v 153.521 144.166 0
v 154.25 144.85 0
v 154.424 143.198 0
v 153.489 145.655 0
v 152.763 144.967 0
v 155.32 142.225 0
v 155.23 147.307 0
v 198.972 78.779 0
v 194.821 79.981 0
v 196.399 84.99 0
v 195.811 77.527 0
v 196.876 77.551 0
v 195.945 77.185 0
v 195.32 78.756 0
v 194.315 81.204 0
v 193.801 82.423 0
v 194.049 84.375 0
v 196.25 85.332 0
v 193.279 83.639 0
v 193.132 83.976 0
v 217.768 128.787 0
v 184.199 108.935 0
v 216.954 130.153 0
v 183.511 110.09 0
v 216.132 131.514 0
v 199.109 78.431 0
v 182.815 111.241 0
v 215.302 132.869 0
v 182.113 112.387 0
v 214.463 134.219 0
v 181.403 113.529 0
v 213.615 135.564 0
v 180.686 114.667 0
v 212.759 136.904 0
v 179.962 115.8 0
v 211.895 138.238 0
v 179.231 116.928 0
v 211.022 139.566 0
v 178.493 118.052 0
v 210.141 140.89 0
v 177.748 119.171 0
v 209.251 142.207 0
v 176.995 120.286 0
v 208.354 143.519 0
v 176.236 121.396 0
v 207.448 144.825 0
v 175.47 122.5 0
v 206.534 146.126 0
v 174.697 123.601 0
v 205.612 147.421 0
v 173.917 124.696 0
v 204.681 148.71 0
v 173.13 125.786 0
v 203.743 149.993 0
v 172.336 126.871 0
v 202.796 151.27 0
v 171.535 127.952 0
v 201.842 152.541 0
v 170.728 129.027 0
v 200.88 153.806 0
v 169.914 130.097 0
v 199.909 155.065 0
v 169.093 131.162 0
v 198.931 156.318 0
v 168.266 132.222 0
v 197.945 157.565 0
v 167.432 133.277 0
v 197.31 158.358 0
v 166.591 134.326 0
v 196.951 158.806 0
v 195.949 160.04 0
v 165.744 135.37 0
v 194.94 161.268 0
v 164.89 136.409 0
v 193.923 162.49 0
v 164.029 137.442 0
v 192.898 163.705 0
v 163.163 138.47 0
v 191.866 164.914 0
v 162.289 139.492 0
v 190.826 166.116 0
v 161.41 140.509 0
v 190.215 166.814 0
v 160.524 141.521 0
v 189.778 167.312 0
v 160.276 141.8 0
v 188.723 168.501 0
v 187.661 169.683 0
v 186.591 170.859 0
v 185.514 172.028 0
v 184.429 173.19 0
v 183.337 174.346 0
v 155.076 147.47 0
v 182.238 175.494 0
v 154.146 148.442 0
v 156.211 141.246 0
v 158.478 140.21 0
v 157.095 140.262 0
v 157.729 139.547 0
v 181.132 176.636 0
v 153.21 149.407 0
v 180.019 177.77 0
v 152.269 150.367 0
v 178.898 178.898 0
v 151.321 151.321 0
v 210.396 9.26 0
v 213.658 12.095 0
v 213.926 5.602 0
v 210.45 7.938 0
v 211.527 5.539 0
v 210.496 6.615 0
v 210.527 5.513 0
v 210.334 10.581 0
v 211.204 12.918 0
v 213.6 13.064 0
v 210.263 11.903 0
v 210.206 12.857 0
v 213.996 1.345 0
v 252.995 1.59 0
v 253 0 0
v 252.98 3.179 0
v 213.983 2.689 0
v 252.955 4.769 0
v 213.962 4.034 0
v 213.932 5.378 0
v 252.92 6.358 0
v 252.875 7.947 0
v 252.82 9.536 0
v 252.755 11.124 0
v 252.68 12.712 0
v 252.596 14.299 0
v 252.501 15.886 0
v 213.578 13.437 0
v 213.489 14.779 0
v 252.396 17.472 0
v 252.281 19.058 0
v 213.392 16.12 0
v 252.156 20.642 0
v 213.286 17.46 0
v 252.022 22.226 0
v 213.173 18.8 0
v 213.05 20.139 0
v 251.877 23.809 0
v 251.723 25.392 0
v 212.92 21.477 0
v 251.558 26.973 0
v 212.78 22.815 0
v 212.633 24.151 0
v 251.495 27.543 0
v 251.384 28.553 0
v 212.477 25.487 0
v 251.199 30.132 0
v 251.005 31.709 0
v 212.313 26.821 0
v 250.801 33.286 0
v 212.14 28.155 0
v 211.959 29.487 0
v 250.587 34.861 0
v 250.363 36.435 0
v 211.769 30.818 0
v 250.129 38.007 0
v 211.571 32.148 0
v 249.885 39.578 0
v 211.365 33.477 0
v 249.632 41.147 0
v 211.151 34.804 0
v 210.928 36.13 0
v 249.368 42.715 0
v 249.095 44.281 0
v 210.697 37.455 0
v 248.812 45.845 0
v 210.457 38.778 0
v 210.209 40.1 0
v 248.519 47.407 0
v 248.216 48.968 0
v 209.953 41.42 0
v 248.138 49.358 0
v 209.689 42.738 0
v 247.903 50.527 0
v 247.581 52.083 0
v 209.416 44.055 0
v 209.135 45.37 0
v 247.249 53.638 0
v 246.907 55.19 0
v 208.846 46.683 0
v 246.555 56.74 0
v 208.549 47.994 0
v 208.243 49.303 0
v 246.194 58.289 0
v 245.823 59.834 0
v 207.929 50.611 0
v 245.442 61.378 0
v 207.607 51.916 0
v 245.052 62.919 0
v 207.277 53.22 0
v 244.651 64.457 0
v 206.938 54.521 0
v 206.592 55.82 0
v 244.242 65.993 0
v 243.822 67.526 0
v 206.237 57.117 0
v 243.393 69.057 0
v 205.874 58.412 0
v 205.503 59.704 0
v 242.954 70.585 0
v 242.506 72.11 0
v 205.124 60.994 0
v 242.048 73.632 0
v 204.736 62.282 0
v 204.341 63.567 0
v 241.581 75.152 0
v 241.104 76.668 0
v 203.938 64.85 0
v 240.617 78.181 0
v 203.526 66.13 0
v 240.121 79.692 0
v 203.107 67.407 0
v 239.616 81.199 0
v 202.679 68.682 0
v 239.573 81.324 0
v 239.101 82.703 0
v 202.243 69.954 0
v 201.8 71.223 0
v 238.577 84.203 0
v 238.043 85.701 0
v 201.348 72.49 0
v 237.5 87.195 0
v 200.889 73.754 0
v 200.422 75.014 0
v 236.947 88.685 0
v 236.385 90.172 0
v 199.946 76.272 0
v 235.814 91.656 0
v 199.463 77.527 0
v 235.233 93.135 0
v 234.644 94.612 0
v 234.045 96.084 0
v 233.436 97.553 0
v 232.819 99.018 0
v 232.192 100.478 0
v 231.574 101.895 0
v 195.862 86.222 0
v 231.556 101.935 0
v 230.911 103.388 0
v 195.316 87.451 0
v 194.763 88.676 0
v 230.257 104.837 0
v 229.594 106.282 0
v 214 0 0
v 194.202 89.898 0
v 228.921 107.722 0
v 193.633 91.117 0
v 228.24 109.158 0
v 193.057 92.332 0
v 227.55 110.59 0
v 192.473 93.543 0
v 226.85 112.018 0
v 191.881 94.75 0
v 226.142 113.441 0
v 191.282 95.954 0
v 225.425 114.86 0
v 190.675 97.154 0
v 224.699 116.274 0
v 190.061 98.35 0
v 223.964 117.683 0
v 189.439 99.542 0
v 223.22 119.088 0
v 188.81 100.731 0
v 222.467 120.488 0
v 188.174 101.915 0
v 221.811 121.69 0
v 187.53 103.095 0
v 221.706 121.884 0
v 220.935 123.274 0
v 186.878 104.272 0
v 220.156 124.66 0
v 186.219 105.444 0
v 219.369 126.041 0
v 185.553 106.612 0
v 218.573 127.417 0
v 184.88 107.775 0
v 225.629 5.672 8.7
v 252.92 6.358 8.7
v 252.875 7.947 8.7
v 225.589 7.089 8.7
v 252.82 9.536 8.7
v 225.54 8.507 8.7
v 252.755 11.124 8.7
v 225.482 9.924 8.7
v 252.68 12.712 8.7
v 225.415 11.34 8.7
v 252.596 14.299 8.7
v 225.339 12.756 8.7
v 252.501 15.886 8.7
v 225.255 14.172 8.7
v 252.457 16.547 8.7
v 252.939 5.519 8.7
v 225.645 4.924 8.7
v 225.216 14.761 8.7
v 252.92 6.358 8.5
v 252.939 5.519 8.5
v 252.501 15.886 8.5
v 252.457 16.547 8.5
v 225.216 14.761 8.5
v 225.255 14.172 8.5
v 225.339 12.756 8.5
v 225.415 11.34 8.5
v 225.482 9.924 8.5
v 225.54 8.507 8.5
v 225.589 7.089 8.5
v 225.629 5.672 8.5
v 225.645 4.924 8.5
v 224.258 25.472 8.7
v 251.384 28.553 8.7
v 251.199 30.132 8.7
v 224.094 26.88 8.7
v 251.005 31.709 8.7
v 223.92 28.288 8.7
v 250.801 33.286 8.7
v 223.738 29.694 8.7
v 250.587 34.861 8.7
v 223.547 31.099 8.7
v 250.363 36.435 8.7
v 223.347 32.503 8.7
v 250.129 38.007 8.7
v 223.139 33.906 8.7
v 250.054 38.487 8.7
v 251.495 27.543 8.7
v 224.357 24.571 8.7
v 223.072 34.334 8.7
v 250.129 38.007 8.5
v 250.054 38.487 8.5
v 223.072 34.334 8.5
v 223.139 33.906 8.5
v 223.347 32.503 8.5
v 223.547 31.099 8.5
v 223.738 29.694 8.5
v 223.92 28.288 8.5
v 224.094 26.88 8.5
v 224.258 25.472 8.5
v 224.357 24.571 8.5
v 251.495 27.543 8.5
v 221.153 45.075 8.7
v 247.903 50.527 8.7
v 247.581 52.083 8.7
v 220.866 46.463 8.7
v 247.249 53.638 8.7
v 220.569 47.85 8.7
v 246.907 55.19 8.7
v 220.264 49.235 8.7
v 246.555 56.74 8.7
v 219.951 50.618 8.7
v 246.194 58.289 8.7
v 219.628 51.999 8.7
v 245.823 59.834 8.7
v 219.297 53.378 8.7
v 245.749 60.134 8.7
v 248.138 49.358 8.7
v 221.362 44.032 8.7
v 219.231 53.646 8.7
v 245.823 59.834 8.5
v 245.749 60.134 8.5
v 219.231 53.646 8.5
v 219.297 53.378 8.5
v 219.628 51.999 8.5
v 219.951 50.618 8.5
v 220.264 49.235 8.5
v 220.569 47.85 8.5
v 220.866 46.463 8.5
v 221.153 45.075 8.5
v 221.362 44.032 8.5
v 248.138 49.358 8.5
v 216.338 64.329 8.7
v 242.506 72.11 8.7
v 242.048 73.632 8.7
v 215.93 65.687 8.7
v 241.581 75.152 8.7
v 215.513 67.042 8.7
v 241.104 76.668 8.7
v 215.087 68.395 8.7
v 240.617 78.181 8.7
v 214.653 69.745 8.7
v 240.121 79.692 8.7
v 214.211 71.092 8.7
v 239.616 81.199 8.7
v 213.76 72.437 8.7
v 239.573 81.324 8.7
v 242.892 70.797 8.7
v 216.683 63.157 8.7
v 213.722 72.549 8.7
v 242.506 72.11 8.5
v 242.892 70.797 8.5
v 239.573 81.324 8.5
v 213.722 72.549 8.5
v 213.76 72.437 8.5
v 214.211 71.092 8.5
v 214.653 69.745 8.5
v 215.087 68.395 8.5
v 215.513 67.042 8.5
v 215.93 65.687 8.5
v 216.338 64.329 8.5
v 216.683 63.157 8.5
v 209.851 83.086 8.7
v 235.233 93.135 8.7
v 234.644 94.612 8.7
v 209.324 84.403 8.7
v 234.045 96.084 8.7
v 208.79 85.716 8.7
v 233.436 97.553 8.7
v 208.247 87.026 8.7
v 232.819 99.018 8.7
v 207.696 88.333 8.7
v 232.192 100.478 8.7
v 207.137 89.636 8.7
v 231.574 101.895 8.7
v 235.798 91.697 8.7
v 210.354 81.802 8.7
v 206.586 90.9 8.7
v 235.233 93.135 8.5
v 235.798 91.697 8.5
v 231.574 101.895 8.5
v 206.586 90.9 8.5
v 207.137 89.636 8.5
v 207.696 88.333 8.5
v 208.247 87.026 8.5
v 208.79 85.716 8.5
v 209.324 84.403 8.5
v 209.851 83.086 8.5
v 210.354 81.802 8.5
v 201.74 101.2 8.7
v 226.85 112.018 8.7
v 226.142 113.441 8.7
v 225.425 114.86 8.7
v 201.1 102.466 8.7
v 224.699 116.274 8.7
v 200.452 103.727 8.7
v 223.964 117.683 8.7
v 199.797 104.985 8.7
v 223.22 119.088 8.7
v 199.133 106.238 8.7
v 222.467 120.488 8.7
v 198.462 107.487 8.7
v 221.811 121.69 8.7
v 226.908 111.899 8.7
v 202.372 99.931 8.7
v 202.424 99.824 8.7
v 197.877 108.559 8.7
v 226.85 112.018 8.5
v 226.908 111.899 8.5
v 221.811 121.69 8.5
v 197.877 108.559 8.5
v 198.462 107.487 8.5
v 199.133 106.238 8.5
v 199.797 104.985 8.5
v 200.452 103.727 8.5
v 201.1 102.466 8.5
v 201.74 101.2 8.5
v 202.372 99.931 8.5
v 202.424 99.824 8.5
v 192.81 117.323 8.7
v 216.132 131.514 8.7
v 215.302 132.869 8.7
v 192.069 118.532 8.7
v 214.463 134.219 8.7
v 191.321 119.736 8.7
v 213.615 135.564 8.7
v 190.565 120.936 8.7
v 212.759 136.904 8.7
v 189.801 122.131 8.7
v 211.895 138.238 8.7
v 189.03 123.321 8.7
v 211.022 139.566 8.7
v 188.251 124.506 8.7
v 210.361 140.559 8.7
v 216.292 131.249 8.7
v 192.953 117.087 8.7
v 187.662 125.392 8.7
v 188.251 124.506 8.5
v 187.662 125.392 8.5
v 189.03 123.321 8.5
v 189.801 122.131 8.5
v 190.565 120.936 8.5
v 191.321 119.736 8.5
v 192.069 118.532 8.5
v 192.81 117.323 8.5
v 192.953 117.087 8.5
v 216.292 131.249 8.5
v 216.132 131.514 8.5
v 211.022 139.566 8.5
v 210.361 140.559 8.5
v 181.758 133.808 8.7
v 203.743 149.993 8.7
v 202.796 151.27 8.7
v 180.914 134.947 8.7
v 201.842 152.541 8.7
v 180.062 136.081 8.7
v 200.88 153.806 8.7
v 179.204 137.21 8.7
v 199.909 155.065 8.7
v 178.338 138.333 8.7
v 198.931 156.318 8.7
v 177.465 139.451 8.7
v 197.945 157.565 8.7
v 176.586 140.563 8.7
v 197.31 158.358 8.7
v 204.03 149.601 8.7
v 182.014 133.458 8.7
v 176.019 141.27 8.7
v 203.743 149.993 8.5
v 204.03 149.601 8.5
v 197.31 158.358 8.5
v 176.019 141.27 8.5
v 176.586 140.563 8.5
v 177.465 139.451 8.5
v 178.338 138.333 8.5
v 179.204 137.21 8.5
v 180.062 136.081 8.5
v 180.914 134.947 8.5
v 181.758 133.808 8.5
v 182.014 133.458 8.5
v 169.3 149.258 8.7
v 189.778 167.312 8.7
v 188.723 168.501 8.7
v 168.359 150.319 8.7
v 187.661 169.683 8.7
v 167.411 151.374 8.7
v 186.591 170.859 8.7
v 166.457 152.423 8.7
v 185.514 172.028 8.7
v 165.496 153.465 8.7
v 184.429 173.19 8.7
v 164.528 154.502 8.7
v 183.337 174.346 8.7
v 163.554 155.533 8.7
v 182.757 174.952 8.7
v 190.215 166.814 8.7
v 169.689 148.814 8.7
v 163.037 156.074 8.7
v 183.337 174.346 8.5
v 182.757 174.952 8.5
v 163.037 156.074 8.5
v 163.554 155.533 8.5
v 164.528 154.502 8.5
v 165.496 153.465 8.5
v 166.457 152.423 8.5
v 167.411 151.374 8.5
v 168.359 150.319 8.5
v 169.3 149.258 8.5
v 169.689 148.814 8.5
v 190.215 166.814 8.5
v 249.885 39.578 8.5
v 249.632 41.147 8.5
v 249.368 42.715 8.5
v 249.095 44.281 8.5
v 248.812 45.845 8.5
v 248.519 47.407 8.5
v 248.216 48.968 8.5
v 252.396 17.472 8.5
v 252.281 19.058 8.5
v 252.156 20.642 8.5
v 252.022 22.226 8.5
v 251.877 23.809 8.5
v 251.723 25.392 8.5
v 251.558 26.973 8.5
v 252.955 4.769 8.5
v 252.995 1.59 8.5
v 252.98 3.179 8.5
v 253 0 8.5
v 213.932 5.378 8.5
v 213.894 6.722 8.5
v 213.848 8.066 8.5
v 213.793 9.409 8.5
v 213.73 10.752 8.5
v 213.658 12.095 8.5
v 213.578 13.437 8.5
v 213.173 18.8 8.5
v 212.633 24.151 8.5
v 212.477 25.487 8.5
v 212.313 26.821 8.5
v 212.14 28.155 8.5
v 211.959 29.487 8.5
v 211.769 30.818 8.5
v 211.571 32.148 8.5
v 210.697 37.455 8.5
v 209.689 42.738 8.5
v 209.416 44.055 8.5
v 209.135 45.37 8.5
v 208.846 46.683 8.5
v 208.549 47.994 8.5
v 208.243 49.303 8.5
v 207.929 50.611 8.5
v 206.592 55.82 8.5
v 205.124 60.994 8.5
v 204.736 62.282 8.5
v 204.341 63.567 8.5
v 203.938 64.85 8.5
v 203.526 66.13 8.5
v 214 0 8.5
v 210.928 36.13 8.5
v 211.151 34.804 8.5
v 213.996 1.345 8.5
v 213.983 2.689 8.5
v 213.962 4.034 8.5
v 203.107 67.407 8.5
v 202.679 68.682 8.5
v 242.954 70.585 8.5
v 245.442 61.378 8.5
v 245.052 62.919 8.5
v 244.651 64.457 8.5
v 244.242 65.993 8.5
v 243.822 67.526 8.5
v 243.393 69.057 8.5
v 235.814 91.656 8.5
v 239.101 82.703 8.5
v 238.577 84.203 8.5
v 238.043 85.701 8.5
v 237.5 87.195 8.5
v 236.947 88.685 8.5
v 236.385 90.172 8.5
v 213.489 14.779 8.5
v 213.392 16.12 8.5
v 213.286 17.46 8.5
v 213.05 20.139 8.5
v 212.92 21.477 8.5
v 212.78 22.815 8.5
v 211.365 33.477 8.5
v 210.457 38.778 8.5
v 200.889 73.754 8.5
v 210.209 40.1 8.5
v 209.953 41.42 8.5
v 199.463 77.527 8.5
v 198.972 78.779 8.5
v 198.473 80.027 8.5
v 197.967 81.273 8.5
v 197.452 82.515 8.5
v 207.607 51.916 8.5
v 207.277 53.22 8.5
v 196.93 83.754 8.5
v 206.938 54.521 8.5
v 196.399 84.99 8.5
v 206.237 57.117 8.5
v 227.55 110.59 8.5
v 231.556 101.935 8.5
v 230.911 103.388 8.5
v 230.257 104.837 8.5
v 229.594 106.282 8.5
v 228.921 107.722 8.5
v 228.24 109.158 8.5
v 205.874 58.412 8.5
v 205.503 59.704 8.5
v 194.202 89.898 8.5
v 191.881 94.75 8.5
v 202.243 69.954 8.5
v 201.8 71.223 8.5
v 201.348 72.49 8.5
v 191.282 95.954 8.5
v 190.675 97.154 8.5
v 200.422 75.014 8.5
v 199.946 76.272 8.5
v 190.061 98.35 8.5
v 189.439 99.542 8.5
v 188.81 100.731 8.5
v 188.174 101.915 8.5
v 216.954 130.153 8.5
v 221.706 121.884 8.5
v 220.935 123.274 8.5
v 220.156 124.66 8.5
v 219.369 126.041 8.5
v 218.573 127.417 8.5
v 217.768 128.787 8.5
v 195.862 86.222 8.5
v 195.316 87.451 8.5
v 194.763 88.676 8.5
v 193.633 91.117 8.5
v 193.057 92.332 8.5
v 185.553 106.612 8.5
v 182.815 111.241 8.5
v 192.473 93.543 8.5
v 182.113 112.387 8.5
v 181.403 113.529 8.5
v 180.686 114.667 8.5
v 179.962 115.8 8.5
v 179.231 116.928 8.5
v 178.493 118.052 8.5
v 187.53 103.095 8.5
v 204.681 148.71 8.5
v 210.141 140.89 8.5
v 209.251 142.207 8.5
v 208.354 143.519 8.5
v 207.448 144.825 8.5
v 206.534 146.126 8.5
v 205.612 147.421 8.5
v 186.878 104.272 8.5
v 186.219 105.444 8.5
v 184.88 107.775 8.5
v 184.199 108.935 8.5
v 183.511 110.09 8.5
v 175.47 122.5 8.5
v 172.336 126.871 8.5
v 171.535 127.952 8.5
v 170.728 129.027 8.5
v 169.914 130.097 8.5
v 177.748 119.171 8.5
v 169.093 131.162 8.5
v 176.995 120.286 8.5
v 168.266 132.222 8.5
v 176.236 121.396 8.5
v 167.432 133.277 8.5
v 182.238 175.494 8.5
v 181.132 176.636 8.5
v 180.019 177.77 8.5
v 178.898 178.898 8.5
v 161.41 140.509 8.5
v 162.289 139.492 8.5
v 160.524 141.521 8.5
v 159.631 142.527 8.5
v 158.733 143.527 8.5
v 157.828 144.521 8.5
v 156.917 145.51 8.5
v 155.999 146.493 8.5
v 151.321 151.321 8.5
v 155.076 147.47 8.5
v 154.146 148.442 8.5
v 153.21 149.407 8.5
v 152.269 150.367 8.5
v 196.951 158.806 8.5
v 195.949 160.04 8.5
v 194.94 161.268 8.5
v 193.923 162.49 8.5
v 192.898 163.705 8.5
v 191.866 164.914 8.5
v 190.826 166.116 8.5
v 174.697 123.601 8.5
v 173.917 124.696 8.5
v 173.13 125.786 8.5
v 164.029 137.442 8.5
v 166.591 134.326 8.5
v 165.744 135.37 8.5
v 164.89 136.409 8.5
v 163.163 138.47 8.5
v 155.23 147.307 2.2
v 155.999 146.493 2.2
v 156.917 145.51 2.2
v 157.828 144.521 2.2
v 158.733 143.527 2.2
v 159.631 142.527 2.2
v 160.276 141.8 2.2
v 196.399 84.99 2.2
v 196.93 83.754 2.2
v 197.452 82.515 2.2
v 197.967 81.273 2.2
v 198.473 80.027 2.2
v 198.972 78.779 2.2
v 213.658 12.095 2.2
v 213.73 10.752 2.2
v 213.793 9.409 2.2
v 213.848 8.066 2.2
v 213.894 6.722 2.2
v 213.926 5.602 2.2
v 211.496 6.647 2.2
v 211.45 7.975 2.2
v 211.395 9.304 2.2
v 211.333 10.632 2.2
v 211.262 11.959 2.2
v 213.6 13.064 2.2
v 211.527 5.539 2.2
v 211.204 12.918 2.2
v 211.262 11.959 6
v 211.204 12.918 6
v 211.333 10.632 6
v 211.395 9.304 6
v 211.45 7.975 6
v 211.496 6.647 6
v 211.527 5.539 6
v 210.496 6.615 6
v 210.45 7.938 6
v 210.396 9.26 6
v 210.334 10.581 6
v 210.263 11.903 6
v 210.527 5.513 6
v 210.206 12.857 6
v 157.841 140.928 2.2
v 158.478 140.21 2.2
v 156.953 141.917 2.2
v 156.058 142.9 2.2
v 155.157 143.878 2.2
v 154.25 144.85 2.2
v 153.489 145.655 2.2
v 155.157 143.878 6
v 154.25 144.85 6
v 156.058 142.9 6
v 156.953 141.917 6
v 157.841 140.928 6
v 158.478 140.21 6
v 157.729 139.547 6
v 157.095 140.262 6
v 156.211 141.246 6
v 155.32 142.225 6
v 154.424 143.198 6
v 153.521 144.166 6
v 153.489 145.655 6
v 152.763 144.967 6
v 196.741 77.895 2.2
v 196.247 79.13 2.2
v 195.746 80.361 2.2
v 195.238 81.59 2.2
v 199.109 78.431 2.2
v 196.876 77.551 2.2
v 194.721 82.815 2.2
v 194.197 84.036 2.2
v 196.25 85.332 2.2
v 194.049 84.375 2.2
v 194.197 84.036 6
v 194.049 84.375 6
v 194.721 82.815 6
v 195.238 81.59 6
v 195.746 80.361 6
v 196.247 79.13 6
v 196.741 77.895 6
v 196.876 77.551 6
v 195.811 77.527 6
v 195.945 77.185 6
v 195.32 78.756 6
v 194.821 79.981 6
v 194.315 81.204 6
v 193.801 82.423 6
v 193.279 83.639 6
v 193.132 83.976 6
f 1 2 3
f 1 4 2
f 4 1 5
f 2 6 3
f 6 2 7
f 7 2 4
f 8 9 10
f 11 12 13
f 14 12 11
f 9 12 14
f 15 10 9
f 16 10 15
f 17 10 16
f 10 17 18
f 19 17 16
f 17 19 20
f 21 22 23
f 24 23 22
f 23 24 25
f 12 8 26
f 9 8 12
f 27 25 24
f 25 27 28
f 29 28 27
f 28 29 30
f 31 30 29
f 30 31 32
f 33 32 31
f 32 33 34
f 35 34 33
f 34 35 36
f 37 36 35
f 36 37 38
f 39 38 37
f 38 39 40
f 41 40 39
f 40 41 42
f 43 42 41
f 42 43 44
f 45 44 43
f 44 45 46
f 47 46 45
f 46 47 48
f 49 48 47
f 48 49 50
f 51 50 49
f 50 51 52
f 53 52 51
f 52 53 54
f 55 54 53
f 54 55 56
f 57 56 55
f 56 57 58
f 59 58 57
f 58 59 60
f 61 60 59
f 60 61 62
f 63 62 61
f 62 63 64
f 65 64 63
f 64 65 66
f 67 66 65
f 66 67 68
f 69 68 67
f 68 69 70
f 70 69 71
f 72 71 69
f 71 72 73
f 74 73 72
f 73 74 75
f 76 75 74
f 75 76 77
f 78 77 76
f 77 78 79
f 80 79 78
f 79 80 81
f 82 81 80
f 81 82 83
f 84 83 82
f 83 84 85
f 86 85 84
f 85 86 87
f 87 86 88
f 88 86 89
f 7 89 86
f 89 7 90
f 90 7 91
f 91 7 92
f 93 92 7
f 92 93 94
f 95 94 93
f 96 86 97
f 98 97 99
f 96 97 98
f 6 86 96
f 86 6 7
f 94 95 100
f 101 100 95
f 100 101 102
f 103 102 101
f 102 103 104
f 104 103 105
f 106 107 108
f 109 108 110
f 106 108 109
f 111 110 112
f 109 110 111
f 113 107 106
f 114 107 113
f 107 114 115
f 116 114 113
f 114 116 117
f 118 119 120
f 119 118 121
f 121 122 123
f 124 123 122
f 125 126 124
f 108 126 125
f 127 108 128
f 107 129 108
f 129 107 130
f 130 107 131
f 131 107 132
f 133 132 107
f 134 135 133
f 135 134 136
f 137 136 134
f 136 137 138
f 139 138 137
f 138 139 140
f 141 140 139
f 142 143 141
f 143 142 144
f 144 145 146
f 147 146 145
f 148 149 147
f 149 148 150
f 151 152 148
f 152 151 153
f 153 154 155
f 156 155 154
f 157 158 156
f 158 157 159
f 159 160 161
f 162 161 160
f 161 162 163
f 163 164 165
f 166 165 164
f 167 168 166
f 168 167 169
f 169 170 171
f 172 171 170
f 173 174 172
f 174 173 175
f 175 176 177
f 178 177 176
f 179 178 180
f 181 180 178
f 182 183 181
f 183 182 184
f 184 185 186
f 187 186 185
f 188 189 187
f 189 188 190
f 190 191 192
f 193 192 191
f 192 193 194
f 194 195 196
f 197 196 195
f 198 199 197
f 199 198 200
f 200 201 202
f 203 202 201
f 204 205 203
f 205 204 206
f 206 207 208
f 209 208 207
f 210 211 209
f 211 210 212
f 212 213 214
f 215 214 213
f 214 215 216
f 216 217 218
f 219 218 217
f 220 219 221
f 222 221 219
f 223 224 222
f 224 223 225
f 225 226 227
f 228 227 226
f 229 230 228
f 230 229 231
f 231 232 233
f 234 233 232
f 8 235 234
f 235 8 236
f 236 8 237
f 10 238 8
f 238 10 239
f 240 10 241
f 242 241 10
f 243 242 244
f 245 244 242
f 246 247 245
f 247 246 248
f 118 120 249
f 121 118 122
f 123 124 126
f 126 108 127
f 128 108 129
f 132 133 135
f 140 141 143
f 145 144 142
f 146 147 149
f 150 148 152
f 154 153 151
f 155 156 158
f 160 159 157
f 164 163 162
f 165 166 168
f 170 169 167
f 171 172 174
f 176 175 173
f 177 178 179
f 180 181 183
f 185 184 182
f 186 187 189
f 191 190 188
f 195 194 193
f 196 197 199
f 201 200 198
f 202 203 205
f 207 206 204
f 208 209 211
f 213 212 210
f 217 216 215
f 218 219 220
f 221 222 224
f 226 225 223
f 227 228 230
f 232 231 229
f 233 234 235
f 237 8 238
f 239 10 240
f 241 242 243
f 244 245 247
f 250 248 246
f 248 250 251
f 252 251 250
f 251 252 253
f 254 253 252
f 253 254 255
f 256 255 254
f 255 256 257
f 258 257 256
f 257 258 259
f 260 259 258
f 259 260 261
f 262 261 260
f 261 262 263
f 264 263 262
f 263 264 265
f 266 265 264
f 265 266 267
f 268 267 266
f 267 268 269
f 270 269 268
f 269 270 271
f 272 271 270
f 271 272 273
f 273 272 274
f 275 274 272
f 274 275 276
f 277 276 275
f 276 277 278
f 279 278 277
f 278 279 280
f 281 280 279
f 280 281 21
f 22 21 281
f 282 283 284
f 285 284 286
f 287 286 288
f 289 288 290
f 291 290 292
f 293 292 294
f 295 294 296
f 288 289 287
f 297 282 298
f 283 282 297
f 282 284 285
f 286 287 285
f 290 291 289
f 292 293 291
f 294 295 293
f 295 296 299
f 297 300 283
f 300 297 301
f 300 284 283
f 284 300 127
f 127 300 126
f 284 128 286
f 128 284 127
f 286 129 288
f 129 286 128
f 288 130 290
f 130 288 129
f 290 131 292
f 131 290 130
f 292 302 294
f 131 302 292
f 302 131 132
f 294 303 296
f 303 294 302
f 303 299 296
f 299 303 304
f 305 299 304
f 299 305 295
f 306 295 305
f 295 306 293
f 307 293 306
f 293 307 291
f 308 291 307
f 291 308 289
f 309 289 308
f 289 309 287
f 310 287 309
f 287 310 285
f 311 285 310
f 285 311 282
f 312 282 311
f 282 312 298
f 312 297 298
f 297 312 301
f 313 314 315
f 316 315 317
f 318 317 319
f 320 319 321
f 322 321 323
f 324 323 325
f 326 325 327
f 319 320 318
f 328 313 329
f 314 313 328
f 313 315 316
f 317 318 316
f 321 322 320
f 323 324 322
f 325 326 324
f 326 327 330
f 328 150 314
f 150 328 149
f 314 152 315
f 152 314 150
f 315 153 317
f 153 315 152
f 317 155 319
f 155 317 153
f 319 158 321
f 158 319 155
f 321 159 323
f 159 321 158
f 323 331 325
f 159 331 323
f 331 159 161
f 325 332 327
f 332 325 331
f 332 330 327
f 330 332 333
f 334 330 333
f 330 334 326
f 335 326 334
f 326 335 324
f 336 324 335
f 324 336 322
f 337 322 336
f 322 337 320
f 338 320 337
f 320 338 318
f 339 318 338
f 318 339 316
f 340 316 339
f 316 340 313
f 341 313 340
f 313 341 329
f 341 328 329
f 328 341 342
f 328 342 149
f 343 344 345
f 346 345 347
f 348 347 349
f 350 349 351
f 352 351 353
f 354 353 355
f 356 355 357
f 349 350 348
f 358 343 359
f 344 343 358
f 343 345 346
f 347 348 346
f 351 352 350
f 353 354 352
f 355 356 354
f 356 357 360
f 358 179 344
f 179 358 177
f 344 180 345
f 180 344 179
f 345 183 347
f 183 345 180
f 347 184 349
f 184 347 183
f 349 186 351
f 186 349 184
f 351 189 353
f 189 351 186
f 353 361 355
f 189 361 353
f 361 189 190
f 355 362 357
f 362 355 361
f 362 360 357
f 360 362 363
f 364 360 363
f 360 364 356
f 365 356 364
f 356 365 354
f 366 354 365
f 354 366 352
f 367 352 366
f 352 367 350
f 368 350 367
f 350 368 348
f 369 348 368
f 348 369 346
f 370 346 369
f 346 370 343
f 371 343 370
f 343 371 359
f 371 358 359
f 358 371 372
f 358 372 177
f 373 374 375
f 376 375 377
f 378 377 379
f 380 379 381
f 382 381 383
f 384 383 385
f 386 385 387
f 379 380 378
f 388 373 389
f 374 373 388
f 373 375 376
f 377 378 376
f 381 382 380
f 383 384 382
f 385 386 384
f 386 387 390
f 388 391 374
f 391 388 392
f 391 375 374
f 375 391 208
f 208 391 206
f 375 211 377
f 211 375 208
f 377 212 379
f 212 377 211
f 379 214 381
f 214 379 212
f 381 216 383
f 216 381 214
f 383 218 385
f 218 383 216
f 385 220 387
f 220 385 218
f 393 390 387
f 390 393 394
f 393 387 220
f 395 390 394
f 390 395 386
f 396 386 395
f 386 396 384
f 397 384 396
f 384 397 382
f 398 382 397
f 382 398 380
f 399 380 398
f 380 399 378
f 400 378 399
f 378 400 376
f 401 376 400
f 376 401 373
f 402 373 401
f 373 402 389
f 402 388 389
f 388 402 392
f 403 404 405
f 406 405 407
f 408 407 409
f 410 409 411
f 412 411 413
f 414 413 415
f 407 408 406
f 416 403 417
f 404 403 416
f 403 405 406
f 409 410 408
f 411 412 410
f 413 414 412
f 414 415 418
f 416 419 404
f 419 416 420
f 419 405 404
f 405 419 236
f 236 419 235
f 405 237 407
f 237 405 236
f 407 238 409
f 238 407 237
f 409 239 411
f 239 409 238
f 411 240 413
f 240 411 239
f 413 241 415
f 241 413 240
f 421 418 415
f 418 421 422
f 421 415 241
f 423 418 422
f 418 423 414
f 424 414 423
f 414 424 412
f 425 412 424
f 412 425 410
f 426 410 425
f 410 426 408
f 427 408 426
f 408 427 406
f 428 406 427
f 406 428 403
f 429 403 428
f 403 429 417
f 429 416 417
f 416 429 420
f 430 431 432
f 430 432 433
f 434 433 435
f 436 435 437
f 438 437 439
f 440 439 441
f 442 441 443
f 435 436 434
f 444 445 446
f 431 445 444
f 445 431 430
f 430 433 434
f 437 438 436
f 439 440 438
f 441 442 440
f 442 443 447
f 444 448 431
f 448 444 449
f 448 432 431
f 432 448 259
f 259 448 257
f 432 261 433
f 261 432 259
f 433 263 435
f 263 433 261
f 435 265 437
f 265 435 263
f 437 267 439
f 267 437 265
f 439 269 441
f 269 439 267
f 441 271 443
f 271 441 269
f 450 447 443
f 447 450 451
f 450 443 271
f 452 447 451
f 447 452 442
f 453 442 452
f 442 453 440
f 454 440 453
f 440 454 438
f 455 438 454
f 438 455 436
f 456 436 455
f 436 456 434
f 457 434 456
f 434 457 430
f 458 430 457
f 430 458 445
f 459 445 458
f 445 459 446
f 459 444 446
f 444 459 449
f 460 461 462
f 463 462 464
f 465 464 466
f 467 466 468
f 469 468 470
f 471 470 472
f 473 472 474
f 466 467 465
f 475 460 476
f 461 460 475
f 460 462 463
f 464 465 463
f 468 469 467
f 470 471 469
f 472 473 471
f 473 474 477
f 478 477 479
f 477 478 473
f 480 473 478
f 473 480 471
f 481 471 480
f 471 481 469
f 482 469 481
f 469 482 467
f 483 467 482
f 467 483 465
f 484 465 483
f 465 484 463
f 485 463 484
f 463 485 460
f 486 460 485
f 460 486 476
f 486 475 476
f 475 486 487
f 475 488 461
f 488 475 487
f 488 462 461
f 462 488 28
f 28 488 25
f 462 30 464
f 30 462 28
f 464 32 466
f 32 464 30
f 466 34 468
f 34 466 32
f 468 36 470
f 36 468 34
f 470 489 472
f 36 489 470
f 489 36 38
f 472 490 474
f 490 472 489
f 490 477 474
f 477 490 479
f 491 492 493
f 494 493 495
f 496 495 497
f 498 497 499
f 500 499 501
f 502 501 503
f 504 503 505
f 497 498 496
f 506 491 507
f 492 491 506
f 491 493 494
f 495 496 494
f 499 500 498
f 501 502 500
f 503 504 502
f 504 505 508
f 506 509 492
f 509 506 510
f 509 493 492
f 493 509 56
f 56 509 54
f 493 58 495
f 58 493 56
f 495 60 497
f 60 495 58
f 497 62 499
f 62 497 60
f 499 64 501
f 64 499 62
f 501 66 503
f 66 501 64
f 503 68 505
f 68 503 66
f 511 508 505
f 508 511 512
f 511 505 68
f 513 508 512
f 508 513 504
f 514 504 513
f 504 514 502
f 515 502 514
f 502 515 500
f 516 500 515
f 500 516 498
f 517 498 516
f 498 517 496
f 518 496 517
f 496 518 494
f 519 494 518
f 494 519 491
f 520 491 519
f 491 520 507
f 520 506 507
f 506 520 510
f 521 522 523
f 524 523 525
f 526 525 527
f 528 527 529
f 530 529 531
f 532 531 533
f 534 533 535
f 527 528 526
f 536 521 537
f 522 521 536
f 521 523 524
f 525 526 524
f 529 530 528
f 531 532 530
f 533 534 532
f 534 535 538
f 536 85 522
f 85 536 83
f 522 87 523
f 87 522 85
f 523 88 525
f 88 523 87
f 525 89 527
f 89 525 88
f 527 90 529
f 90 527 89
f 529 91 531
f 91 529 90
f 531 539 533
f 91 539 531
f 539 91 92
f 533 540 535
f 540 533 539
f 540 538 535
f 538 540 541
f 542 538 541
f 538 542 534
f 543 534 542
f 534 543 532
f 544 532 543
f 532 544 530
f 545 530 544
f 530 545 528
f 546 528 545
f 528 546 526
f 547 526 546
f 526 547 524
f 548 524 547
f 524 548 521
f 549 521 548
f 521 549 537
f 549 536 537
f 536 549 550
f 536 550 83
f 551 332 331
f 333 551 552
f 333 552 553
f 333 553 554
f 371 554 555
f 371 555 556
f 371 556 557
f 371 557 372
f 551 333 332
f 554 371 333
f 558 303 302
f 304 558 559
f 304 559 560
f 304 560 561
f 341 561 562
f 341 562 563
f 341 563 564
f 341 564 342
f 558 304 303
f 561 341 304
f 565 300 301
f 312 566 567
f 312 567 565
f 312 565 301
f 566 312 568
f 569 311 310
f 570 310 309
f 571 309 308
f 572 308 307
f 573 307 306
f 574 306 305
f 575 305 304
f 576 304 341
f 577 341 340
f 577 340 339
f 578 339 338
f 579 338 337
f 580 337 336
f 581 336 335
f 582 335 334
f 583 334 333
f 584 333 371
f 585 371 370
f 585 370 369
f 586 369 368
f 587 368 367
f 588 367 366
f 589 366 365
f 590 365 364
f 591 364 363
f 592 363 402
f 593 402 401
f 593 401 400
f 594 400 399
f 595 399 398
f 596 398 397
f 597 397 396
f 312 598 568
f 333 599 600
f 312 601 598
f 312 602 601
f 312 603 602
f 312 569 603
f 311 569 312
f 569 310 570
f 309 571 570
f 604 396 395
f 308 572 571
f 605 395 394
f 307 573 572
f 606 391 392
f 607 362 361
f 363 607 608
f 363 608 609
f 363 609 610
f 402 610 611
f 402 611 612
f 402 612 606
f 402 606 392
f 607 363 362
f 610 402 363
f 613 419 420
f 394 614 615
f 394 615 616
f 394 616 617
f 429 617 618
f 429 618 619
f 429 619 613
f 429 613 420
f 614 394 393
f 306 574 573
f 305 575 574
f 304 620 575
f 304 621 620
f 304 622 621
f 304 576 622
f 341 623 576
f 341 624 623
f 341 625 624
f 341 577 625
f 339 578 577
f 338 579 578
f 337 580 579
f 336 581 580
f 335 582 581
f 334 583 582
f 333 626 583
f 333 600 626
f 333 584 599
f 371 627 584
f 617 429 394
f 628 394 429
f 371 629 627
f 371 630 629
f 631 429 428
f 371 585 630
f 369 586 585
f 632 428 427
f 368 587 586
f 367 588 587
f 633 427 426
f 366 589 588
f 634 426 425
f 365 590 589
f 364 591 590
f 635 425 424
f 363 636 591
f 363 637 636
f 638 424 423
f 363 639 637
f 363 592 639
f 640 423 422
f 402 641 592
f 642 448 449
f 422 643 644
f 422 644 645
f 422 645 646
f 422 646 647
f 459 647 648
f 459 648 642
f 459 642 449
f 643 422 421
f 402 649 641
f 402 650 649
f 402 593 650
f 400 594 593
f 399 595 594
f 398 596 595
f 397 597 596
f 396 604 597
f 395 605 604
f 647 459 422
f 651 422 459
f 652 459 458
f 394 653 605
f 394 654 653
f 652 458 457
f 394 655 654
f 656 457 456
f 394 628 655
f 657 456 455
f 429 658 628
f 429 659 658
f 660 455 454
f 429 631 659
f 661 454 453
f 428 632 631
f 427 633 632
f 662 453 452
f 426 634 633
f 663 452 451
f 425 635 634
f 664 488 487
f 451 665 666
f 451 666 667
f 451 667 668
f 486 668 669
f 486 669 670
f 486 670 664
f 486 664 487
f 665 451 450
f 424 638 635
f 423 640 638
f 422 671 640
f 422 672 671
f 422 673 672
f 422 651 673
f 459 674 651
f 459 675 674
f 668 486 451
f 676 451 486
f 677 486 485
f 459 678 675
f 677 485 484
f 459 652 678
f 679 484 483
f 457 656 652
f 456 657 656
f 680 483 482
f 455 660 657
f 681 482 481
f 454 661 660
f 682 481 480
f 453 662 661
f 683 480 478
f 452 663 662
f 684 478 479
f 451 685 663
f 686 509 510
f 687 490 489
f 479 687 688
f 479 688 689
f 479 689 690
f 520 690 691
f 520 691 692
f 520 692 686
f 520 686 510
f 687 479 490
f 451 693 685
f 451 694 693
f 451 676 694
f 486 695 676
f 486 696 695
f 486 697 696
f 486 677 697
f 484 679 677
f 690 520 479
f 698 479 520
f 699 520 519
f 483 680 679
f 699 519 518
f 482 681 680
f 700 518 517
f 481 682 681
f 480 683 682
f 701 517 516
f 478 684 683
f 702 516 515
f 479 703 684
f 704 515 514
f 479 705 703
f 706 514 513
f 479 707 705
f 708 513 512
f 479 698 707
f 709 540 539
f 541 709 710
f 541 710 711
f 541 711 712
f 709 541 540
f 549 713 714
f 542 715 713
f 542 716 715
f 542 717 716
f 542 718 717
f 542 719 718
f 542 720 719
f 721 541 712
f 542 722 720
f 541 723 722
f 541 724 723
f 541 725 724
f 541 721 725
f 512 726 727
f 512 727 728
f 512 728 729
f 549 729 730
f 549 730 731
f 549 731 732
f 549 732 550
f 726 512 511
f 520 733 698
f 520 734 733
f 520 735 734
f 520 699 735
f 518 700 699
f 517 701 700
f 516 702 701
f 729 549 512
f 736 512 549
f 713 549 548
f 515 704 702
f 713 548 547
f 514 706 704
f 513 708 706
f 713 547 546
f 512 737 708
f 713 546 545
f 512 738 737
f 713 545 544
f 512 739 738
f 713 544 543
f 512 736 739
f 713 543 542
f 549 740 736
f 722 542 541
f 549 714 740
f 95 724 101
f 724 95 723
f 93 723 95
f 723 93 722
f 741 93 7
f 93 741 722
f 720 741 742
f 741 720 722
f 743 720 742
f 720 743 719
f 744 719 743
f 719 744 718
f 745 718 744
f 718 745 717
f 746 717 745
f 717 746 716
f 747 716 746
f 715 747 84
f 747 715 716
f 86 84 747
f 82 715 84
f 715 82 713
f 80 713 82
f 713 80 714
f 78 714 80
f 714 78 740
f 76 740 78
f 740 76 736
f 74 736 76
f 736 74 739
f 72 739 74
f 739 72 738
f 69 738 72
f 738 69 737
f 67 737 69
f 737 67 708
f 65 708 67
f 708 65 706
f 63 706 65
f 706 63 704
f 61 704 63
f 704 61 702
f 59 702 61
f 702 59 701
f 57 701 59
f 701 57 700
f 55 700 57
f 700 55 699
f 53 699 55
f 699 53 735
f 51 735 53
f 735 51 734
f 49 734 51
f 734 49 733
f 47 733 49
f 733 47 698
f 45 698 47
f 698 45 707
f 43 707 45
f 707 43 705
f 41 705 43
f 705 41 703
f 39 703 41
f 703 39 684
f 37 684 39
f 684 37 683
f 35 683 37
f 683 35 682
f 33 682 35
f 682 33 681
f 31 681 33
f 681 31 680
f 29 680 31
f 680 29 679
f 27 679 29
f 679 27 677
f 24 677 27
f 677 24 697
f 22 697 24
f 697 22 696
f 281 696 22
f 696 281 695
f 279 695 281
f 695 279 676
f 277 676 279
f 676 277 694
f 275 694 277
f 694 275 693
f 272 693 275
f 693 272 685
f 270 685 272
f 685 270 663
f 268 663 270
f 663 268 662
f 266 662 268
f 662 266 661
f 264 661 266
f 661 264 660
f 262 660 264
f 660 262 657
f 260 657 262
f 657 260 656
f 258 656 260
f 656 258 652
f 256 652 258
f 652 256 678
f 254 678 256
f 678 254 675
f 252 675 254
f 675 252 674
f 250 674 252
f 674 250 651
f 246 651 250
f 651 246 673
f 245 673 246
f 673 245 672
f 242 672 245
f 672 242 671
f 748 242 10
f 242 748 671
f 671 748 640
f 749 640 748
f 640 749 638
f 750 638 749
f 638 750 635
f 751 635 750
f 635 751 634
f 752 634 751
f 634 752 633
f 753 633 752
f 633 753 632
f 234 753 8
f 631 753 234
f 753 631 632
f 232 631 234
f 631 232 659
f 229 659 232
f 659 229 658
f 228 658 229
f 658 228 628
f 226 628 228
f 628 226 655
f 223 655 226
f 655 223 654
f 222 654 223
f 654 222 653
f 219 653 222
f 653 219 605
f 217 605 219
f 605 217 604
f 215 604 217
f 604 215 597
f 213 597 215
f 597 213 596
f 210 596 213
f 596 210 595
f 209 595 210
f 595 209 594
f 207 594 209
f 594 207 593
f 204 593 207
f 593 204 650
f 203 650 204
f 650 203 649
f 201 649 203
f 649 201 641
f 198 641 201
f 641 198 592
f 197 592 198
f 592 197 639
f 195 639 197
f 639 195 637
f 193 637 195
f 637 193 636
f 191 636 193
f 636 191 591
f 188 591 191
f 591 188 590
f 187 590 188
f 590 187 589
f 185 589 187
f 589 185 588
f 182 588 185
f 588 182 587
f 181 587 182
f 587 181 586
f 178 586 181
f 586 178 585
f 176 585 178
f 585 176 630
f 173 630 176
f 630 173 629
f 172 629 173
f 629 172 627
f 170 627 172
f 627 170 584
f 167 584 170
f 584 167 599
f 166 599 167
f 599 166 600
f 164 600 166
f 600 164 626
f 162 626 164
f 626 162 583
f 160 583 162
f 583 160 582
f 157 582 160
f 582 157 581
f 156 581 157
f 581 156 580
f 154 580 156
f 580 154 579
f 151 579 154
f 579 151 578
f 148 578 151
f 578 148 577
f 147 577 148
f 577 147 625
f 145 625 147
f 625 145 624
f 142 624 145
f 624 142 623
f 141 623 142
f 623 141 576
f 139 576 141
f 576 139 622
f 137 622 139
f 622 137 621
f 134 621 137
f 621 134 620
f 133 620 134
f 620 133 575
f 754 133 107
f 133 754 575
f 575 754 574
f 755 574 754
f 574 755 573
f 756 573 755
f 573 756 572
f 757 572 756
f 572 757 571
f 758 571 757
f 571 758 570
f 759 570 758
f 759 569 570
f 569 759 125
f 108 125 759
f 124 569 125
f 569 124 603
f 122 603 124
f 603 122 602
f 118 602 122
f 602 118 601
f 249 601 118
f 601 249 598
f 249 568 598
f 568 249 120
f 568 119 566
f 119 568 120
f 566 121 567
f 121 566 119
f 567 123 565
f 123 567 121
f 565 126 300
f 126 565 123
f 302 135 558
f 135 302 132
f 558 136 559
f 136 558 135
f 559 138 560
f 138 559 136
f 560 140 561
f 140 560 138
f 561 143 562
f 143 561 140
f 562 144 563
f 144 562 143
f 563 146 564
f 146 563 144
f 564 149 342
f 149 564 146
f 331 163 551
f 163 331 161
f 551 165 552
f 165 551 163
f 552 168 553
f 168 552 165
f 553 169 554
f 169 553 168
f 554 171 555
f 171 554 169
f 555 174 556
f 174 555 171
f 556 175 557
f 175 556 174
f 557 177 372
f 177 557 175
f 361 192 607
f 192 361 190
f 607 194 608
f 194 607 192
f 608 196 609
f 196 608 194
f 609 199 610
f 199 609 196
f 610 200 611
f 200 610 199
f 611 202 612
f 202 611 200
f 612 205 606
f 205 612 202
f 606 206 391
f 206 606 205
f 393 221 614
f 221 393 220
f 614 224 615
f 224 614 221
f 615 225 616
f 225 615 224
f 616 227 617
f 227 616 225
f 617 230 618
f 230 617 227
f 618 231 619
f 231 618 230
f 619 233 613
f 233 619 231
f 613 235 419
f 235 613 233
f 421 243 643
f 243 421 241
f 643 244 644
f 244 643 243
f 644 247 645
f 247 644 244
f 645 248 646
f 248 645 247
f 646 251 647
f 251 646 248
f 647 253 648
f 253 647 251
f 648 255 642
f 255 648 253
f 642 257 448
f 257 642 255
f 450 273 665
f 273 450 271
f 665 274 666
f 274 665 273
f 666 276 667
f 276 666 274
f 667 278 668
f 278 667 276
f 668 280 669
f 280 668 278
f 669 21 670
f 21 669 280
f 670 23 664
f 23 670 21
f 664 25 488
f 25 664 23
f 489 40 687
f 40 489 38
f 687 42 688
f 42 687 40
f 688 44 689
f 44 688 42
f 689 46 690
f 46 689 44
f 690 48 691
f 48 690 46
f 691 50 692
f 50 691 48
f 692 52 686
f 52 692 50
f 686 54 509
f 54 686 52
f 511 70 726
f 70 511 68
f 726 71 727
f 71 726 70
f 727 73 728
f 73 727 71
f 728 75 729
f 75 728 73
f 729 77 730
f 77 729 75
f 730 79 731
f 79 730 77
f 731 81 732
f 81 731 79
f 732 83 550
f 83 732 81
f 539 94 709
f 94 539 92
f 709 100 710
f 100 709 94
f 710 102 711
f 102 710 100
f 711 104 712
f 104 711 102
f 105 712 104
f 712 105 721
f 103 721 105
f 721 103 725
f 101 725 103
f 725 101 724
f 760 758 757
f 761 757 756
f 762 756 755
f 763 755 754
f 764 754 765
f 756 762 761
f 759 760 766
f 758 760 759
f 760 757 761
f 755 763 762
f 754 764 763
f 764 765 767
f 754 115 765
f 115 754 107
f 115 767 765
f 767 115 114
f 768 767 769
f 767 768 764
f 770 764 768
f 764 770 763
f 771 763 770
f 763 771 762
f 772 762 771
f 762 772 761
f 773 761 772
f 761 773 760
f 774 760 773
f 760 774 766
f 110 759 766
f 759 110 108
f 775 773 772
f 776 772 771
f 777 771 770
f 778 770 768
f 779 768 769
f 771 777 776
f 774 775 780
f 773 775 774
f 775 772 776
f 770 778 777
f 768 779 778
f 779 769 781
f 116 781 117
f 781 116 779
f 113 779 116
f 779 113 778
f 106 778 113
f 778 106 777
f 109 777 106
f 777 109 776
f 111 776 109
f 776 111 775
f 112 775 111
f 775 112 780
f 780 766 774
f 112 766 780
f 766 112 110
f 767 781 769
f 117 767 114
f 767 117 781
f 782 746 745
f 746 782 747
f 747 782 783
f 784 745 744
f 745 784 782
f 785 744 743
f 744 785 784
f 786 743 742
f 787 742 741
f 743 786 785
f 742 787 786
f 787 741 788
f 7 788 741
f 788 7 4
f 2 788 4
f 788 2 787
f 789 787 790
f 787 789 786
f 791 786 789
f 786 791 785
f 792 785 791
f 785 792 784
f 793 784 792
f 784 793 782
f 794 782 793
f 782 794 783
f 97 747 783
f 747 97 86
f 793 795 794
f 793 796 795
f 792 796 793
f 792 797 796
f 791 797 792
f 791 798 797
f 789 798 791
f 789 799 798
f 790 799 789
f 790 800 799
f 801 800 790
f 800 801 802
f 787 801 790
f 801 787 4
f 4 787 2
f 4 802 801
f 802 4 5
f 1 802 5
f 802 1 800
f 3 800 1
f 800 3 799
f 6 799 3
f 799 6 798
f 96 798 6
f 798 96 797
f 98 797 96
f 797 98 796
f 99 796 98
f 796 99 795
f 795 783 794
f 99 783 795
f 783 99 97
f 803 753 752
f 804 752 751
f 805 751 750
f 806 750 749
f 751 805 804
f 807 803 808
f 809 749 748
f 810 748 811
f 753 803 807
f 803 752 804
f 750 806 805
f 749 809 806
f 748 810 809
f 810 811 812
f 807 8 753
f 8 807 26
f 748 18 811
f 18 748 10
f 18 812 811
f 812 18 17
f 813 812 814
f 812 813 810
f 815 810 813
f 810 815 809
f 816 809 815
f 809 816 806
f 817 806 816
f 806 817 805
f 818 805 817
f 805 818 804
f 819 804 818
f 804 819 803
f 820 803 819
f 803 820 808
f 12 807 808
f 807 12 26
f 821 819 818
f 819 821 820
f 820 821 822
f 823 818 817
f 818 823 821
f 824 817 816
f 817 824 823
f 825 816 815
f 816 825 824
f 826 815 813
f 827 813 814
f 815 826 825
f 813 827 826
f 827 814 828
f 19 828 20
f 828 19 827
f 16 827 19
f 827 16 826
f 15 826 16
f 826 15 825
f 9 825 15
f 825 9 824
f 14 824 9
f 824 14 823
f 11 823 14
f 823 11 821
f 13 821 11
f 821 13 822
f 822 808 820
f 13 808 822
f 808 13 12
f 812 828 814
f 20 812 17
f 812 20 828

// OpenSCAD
// file: 3d_arc.scad
// https://openhome.cc/eGossip/OpenSCAD/SectorArc.html

module sector(radius, begin, end, fn) {
    r = radius / cos(180 / fn);
    step = -360 / fn;

    points = concat([[0, 0]],
        [for(a = [begin : step : end - 360]) 
            [r * cos(a), r * sin(a)]
        ],
        [[r * cos(end), r * sin(end)]]
    );

    difference() {
        circle(radius, $fn = fn); // cilinder
        polygon(points);
    }
}

module arc(radius, begin, end, width, fn) {
    difference() {
        sector(radius + width, begin, end, fn);
        sector(radius, begin, end, fn);
    }
} 


module 3d_arc(height, radius, width, begin, end, fn) {
    linear_extrude(height) arc(radius, begin, end, width, fn);
}
// main file
// https://openhome.cc/eGossip/OpenSCAD/SectorArc.html

// width is the angle
// lenght is distance from the center of the circunference
// height is the thinkness

include <3d_arc.scad>

fn = 1000;

// kerb

kerb_radius = 214; // mm
kerb_length = 39; // mm
kerb_height = 8.5; // mm
kerb_width = 45; // deg

3d_arc(kerb_height, kerb_radius, kerb_length, 0, kerb_width, fn);

// hooks

hook_offset = 1.5; // deg
hook_width = 2; // deg
hook_bend_height = 2.2; // mm
hook_bend_length = 2.4; // mm
hook_barb_height = 6; // mm
hook_barb_length = 1; // mm

3d_arc(hook_bend_height, kerb_radius - hook_bend_length, hook_bend_length, hook_offset, hook_offset + hook_width, fn);
3d_arc(hook_barb_height, kerb_radius - hook_bend_length - hook_barb_length, hook_barb_length, hook_offset, hook_offset + hook_width, fn);

3d_arc(hook_bend_height, kerb_radius - hook_bend_length, hook_bend_length, kerb_width - hook_offset, kerb_width - hook_offset - hook_width, fn);
3d_arc(hook_barb_height, kerb_radius - hook_bend_length - hook_barb_length, hook_barb_length, kerb_width - hook_offset, kerb_width - hook_offset - hook_width, fn);

3d_arc(hook_bend_height, kerb_radius - hook_bend_length, hook_bend_length, kerb_width/2 - hook_width/2, kerb_width/2 + hook_width/2, fn);
3d_arc(hook_barb_height, kerb_radius - hook_bend_length - hook_barb_length, hook_barb_length, kerb_width/2 - hook_width/2, kerb_width/2 + hook_width/2, fn);

// strips

strip_count = 9; // #
strip_width = 0.5; // %
strip_length = 0.7; // %
strip_height = 0.2; // mm

strip_angle = kerb_width / strip_count;

for(i = [0 : strip_count - 1]) {
    strip_offset = i * strip_angle;
    strip_center = strip_offset + strip_angle / 2;
    begin = strip_center - strip_width * strip_angle / 2;
    end = strip_center + strip_width * strip_angle / 2;

    3d_arc(kerb_height + strip_height, kerb_radius + kerb_length * (1 - strip_length), strip_length * kerb_length, begin, end, fn);
}
